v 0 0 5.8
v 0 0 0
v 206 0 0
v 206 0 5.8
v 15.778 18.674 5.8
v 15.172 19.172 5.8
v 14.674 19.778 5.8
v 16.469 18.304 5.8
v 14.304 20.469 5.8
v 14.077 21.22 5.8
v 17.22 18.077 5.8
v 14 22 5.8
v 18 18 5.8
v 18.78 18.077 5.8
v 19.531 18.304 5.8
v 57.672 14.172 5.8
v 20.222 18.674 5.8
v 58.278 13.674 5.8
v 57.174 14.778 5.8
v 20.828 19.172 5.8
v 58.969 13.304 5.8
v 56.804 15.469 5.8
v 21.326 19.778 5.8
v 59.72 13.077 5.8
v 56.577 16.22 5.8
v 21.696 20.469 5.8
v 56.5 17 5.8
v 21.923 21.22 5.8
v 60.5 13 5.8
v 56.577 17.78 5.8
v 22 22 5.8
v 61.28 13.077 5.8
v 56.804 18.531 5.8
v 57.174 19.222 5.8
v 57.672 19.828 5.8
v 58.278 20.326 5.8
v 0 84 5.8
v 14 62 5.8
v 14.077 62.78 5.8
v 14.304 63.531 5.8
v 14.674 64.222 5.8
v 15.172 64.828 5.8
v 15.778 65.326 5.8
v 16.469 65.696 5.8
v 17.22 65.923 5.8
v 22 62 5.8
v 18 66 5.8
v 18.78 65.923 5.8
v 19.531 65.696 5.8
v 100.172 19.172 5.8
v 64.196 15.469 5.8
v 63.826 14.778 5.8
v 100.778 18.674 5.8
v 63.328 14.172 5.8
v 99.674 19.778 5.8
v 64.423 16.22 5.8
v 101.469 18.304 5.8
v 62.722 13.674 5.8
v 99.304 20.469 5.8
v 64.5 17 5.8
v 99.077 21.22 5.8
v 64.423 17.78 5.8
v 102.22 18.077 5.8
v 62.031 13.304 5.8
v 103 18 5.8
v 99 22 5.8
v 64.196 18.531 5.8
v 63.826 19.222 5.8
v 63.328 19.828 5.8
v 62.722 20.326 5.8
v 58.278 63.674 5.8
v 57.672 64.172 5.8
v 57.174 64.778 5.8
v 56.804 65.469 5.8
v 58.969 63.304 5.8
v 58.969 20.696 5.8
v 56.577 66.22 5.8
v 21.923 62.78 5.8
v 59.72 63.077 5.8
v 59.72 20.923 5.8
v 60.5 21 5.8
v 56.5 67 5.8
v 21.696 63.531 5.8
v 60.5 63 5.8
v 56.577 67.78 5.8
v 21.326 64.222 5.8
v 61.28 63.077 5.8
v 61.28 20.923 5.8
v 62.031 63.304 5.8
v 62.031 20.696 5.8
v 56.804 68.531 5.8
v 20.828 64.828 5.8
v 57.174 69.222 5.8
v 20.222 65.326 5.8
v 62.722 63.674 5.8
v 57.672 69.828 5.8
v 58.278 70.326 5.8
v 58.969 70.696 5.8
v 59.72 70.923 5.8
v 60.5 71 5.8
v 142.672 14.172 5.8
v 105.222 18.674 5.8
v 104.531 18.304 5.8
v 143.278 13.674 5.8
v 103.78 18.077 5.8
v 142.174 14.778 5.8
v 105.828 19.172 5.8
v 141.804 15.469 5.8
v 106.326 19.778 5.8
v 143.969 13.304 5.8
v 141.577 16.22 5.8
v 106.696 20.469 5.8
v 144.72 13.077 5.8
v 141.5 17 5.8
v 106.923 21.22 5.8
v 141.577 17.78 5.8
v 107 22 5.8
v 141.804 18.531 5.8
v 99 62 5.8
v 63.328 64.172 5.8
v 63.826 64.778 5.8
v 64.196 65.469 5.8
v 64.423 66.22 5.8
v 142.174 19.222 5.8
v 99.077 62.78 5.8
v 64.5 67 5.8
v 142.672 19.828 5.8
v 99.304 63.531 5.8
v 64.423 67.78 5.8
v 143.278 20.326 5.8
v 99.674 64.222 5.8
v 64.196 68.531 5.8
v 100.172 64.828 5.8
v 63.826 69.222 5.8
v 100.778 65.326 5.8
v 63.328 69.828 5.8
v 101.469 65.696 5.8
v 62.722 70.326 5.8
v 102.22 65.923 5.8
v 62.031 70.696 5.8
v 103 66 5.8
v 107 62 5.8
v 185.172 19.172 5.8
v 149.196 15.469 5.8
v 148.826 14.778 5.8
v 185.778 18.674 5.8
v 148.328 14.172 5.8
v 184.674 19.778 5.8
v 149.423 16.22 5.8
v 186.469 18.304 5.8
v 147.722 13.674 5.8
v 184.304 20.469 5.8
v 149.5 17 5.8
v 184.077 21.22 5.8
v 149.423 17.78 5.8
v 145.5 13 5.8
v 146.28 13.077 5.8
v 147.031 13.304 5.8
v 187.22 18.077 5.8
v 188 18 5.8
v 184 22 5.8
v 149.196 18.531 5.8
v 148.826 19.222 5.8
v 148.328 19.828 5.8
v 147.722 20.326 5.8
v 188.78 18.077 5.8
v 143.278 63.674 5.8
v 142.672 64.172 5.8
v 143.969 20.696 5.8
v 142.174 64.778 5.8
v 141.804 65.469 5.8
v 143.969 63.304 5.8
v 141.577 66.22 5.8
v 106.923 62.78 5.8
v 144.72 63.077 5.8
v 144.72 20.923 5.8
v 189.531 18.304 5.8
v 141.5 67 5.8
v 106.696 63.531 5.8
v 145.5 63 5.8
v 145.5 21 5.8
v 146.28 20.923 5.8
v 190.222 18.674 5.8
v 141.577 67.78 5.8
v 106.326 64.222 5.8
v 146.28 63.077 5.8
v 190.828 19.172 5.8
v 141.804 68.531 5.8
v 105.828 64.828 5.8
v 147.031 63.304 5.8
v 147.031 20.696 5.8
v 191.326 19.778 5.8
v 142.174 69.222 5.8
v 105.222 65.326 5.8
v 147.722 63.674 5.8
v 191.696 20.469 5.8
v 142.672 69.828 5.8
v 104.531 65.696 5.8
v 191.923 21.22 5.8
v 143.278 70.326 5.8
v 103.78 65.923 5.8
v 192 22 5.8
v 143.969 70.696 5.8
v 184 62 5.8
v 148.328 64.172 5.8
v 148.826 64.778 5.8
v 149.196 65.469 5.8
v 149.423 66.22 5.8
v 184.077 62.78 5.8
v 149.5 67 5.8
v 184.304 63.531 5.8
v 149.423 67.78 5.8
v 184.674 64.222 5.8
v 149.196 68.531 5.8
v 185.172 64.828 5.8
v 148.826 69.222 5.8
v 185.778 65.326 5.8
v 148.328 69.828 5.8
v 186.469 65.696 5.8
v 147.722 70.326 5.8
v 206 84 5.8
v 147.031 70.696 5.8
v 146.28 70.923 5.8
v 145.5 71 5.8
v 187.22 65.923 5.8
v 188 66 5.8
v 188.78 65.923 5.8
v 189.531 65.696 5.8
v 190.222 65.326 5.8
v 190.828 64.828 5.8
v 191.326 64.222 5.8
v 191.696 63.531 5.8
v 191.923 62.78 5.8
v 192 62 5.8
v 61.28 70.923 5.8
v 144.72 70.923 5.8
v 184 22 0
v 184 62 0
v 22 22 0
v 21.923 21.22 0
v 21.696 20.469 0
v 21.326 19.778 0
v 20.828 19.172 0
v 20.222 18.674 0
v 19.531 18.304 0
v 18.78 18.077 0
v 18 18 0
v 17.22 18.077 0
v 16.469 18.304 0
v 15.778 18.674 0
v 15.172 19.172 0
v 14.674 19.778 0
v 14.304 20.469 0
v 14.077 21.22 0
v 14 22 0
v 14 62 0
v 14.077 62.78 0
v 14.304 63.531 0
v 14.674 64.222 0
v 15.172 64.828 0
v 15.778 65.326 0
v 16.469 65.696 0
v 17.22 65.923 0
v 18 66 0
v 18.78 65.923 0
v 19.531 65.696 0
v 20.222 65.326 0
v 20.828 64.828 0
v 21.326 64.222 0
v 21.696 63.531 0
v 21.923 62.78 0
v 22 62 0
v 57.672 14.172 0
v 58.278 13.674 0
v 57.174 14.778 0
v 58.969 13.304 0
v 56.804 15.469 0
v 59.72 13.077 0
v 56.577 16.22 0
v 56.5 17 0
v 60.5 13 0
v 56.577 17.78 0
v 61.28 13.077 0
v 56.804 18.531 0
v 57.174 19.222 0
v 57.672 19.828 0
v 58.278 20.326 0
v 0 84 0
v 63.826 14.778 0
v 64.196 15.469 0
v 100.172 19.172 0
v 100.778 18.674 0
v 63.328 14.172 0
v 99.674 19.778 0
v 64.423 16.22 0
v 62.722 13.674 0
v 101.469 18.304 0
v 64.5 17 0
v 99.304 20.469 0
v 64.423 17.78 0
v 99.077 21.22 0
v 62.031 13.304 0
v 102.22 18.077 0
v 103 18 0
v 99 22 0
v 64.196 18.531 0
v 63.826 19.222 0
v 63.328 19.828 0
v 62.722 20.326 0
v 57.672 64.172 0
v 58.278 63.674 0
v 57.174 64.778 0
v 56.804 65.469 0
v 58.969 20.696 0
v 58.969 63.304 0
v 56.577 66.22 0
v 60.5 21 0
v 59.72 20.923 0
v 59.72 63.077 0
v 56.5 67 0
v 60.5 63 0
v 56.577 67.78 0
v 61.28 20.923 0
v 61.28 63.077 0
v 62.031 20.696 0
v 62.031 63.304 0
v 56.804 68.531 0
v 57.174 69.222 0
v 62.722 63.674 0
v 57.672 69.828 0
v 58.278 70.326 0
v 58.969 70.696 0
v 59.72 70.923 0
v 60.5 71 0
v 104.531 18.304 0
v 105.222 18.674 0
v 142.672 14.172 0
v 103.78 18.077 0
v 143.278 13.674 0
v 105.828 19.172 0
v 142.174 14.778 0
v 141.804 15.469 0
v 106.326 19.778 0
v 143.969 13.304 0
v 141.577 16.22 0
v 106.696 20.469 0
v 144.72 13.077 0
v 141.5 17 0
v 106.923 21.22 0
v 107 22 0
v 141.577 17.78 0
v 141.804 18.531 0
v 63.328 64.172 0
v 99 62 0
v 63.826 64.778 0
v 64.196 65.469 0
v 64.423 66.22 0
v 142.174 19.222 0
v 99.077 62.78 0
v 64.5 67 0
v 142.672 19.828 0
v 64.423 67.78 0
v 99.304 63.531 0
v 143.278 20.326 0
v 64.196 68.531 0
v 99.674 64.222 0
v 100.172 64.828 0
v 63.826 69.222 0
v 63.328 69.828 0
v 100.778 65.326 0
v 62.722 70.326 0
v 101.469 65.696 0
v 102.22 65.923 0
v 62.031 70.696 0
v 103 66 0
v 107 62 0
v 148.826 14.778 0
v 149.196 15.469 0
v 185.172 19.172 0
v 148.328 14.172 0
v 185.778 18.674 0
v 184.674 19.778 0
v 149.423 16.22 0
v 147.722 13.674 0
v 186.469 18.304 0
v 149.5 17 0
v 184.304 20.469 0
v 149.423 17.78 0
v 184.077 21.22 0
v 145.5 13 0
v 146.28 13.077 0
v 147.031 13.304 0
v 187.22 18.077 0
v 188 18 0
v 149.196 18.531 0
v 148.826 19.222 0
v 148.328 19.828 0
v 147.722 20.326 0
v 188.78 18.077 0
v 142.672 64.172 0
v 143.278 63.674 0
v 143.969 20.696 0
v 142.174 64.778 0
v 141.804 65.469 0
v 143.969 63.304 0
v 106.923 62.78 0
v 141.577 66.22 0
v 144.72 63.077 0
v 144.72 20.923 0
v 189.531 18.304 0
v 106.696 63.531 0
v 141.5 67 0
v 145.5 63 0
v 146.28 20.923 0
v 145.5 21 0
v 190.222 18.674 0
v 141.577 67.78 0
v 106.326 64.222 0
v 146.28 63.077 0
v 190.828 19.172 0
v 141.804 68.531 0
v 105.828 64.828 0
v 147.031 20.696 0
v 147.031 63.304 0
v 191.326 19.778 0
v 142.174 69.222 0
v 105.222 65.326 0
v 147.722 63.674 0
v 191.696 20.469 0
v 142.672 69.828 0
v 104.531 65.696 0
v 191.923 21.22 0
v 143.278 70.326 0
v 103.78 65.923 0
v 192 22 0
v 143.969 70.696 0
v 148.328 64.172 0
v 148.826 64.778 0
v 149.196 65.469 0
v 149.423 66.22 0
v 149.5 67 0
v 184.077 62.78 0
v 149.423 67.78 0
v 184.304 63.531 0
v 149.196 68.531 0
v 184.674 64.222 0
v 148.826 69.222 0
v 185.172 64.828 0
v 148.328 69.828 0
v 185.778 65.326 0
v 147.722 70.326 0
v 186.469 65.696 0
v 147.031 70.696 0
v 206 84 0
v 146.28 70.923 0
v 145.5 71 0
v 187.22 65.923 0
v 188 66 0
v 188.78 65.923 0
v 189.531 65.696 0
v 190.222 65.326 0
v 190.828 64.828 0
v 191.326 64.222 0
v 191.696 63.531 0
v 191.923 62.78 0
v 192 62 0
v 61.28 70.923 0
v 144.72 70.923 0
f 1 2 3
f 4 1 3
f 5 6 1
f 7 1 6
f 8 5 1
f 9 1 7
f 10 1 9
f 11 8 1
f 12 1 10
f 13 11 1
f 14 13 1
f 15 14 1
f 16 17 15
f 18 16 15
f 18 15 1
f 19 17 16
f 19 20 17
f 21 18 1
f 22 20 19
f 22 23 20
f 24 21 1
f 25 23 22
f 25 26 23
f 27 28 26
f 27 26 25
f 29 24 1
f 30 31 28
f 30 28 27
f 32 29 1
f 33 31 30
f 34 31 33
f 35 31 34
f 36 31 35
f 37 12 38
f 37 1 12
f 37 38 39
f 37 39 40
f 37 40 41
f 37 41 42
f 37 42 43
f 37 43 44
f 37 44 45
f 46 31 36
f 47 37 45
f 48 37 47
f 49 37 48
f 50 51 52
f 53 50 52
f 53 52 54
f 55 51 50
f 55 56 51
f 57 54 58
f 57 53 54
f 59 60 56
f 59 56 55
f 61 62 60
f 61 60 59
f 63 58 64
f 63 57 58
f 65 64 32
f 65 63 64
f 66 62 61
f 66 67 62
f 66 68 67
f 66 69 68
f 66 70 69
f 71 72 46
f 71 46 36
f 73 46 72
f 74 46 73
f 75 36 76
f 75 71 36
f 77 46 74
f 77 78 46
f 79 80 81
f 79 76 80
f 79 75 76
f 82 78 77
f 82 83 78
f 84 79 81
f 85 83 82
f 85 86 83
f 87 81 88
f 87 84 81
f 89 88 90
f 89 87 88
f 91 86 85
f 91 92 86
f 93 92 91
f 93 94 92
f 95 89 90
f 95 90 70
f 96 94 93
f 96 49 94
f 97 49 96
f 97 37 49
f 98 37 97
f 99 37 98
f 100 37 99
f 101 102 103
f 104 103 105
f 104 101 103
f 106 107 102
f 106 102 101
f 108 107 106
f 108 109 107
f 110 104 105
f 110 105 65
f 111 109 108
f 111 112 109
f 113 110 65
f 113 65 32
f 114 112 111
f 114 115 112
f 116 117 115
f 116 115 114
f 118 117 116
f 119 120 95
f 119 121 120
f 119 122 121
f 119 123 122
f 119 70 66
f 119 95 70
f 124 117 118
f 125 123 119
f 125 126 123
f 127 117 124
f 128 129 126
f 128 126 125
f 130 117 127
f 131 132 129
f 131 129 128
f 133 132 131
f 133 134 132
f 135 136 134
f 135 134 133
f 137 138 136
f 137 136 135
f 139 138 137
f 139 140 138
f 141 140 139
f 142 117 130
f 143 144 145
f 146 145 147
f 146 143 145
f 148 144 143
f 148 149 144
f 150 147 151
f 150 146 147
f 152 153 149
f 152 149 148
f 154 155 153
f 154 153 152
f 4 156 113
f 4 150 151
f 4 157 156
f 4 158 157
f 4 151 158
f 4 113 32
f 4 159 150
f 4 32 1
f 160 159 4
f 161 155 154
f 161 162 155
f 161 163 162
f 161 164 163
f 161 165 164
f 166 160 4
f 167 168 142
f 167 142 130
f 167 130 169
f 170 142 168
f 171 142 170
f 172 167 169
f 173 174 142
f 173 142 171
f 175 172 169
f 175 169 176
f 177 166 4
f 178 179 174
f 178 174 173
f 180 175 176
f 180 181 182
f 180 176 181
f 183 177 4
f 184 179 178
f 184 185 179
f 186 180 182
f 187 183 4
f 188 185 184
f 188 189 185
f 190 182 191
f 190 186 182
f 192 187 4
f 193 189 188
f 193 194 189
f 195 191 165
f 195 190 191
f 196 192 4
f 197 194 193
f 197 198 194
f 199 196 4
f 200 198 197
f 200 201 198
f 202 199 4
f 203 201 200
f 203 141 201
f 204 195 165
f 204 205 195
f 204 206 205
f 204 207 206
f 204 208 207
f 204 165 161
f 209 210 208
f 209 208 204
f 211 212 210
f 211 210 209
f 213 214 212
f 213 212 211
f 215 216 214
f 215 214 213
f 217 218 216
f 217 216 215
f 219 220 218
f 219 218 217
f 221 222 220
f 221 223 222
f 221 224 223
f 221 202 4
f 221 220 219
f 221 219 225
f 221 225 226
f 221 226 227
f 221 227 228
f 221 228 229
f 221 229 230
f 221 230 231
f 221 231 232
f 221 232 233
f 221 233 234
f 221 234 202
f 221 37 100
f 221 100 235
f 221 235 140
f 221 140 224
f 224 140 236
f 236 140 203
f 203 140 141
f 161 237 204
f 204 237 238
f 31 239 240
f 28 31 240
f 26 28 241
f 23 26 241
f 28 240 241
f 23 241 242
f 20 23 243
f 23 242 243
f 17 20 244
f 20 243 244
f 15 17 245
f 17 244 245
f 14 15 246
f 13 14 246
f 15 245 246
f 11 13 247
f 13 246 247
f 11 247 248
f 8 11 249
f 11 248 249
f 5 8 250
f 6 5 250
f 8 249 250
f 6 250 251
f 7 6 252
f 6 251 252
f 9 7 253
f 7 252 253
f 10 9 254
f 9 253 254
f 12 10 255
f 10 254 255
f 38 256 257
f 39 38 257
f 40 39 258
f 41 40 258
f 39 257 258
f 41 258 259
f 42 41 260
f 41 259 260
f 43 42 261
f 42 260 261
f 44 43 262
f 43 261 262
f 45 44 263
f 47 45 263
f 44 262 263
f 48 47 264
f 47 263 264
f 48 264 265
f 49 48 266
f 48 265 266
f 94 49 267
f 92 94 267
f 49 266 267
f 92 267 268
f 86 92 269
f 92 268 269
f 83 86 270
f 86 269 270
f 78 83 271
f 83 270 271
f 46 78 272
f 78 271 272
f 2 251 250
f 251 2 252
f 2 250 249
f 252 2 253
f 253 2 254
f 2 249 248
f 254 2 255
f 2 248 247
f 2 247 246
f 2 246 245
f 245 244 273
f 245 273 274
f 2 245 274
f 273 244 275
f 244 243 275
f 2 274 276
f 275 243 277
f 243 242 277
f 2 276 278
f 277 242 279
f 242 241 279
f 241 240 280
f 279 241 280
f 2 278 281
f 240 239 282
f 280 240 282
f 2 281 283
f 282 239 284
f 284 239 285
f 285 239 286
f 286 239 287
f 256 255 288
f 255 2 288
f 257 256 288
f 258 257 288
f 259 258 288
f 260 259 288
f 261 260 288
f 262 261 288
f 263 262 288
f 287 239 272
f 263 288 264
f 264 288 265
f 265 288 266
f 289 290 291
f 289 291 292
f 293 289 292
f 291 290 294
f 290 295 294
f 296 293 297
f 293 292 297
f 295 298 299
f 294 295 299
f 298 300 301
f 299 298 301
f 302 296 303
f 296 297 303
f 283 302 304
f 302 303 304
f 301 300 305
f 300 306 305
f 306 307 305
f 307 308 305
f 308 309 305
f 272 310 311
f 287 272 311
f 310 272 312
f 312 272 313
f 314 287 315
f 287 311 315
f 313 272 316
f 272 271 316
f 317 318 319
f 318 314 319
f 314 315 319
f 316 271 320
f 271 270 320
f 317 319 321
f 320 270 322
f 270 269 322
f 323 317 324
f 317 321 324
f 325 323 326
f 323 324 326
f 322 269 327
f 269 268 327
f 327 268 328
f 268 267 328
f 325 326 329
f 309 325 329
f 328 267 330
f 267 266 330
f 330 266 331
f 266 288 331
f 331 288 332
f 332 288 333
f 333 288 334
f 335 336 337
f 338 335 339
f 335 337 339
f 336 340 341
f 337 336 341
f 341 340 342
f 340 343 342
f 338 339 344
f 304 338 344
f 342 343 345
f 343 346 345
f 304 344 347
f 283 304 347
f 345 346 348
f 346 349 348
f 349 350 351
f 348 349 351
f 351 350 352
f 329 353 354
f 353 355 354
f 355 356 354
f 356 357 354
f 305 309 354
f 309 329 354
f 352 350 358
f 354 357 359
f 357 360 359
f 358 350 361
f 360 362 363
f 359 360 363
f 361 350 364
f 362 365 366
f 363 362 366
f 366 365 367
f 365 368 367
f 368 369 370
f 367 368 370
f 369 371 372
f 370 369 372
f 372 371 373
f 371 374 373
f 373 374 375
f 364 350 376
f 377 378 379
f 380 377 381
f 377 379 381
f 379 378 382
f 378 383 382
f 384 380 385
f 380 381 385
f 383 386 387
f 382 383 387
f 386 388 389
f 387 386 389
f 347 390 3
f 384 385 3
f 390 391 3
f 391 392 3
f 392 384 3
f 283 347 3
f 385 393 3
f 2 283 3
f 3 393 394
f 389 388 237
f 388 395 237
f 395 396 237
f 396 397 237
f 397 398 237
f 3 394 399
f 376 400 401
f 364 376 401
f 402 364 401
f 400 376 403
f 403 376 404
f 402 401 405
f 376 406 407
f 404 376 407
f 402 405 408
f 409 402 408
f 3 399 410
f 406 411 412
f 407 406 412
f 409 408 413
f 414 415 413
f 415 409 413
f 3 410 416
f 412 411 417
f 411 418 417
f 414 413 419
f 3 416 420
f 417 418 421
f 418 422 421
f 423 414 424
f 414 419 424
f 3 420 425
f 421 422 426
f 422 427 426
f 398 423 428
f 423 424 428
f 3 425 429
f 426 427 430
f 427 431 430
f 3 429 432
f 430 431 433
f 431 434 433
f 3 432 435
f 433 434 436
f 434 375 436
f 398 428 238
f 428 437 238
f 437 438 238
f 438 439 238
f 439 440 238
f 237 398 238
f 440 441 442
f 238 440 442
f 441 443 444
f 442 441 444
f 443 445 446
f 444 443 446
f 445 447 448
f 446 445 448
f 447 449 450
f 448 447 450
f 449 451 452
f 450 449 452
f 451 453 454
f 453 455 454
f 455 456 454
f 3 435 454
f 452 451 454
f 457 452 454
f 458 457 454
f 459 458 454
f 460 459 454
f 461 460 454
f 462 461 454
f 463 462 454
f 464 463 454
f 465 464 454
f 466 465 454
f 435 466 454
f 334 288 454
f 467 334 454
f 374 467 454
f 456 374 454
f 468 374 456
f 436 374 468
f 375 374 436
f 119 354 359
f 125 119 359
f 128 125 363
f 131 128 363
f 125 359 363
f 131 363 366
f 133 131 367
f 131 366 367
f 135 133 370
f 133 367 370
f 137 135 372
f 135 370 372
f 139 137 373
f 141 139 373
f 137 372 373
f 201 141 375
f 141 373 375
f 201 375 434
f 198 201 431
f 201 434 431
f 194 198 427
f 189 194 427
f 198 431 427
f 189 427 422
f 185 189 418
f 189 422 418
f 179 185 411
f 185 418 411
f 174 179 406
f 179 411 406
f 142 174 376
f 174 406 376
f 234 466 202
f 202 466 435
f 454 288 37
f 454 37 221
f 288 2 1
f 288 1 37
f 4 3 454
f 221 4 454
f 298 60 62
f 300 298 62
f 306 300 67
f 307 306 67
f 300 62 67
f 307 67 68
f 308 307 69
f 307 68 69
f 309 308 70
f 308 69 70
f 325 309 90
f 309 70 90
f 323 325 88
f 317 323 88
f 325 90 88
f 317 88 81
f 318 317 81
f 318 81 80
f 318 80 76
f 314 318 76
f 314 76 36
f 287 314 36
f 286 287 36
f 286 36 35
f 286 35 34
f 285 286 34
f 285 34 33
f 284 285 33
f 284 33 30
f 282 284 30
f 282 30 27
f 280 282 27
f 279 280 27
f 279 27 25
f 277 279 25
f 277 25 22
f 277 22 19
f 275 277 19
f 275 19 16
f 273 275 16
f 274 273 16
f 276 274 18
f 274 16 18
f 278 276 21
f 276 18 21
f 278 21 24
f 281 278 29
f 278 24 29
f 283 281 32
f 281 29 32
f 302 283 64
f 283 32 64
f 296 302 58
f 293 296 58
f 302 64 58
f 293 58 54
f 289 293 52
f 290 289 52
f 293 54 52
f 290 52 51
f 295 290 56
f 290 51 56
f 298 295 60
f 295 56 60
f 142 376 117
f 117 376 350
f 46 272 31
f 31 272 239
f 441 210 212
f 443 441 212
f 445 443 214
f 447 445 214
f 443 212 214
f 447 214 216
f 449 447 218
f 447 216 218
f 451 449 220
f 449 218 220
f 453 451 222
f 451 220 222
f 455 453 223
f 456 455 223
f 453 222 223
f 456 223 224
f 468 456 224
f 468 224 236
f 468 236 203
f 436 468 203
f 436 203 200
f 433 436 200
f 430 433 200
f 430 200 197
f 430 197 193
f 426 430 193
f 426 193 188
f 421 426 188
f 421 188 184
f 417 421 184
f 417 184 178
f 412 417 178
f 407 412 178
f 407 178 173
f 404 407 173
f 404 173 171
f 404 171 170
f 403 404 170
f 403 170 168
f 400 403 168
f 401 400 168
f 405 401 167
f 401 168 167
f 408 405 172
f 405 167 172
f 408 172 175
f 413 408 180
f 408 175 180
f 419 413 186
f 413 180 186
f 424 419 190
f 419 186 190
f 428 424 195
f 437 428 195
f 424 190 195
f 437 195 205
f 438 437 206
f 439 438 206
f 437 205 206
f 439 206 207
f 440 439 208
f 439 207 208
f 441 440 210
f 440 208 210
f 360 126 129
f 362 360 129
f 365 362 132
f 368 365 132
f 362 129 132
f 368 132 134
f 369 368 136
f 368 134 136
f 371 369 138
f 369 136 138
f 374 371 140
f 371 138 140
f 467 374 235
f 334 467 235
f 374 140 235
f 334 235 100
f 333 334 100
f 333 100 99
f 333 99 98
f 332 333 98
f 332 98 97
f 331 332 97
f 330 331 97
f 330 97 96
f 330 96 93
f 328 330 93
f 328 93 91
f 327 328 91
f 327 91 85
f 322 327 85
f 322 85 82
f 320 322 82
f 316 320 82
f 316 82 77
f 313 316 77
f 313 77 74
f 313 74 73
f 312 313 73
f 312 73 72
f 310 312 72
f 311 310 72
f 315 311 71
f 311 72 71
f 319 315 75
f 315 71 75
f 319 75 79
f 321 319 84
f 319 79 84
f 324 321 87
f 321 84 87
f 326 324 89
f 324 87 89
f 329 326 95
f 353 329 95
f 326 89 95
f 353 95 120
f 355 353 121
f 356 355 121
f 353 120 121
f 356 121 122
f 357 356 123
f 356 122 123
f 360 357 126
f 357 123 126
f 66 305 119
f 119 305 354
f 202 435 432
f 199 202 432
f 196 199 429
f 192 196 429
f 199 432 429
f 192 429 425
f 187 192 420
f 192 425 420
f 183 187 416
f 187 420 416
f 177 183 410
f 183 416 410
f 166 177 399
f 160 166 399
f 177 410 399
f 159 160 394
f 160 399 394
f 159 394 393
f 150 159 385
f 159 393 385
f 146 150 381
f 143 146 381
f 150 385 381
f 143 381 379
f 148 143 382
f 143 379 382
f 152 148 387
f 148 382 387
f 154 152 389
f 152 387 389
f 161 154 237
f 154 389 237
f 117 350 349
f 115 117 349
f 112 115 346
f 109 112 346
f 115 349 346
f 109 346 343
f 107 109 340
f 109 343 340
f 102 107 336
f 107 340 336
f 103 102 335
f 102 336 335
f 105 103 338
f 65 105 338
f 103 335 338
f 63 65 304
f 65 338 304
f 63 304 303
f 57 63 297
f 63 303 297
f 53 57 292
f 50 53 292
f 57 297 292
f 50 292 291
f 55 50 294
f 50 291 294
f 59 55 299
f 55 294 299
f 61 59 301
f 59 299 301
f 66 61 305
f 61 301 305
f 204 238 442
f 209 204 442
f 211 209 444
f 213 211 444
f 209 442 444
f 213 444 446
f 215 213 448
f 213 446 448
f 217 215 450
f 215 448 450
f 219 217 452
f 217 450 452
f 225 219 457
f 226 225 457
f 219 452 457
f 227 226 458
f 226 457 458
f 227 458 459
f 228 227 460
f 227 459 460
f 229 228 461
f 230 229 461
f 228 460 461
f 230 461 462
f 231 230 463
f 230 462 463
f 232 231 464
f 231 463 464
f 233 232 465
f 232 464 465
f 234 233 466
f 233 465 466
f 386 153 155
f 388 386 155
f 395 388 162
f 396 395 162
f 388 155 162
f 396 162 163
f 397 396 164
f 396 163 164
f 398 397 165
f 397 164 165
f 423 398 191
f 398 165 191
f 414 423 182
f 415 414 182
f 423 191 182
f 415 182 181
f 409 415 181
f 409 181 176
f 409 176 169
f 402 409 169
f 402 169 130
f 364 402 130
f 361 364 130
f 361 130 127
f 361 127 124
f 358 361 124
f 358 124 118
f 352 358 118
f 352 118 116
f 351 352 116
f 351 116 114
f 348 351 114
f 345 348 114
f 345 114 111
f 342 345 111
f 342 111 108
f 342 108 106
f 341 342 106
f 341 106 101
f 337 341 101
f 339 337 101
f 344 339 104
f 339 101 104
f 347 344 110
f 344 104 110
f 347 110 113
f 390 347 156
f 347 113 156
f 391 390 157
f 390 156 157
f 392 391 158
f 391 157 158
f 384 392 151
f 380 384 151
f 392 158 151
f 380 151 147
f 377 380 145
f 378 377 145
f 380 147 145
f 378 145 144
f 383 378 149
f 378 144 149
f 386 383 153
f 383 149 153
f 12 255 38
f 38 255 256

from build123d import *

# Parameters (mm, degrees)
SKETCH_1_W          = 206
SKETCH_1_H          = 84
EXTRUDE_1_DEPTH     = 5.8
CUT_EXTRUDE_1_REACH = 224.544
SKETCH_2_R          = 4


with BuildPart() as part:
    # Эскиз1 → Бобышка-Вытянуть1 (new body)
    with BuildSketch(Plane.XY):
        with Locations((103, 42)):
            Rectangle(SKETCH_1_W, SKETCH_1_H)
        with BuildLine():
            Line((22, 62), (22, 22))
            ThreePointArc((22, 22), (18, 18), (14, 22))
            Line((14, 22), (14, 62))
            ThreePointArc((14, 62), (18, 66), (22, 62))
        make_face(mode=Mode.SUBTRACT)
        with BuildLine():
            Line((107, 62), (107, 22))
            ThreePointArc((107, 22), (103, 18), (99, 22))
            Line((99, 22), (99, 62))
            ThreePointArc((99, 62), (103, 66), (107, 62))
        make_face(mode=Mode.SUBTRACT)
        with BuildLine():
            Line((192, 62), (192, 22))
            ThreePointArc((192, 22), (188, 18), (184, 22))
            Line((184, 22), (184, 62))
            ThreePointArc((184, 62), (188, 66), (192, 62))
        make_face(mode=Mode.SUBTRACT)
    extrude(amount=EXTRUDE_1_DEPTH)

    # Эскиз2 → Вырез-Вытянуть1 (cut, up to next)
    with BuildSketch(Plane.XY.offset(5.8), mode=Mode.PRIVATE) as cut_extrude_1_sk1:
        with Locations((60.5, 67)):
            Circle(SKETCH_2_R)
    cut_extrude_1_tool1 = extrude(cut_extrude_1_sk1.sketch, amount=-CUT_EXTRUDE_1_REACH, mode=Mode.PRIVATE) & part.part
    # Эскиз2 → Вырез-Вытянуть1 (cut, up to next)
    with BuildSketch(Plane.XY.offset(5.8), mode=Mode.PRIVATE) as cut_extrude_1_sk2:
        with Locations((60.5, 17)):
            Circle(SKETCH_2_R)
    cut_extrude_1_tool2 = extrude(cut_extrude_1_sk2.sketch, amount=-CUT_EXTRUDE_1_REACH, mode=Mode.PRIVATE) & part.part
    # Эскиз2 → Вырез-Вытянуть1 (cut, up to next)
    with BuildSketch(Plane.XY.offset(5.8), mode=Mode.PRIVATE) as cut_extrude_1_sk3:
        with Locations((145.5, 17)):
            Circle(SKETCH_2_R)
    cut_extrude_1_tool3 = extrude(cut_extrude_1_sk3.sketch, amount=-CUT_EXTRUDE_1_REACH, mode=Mode.PRIVATE) & part.part
    # Эскиз2 → Вырез-Вытянуть1 (cut, up to next)
    with BuildSketch(Plane.XY.offset(5.8), mode=Mode.PRIVATE) as cut_extrude_1_sk4:
        with Locations((145.5, 67)):
            Circle(SKETCH_2_R)
    cut_extrude_1_tool4 = extrude(cut_extrude_1_sk4.sketch, amount=-CUT_EXTRUDE_1_REACH, mode=Mode.PRIVATE) & part.part
    add(cut_extrude_1_tool1.solids().sort_by_distance((60.5, 67, 5.8))[0], mode=Mode.SUBTRACT)
    add(cut_extrude_1_tool2.solids().sort_by_distance((60.5, 17, 5.8))[0], mode=Mode.SUBTRACT)
    add(cut_extrude_1_tool3.solids().sort_by_distance((145.5, 17, 5.8))[0], mode=Mode.SUBTRACT)
    add(cut_extrude_1_tool4.solids().sort_by_distance((145.5, 67, 5.8))[0], mode=Mode.SUBTRACT)


solid = part.part
